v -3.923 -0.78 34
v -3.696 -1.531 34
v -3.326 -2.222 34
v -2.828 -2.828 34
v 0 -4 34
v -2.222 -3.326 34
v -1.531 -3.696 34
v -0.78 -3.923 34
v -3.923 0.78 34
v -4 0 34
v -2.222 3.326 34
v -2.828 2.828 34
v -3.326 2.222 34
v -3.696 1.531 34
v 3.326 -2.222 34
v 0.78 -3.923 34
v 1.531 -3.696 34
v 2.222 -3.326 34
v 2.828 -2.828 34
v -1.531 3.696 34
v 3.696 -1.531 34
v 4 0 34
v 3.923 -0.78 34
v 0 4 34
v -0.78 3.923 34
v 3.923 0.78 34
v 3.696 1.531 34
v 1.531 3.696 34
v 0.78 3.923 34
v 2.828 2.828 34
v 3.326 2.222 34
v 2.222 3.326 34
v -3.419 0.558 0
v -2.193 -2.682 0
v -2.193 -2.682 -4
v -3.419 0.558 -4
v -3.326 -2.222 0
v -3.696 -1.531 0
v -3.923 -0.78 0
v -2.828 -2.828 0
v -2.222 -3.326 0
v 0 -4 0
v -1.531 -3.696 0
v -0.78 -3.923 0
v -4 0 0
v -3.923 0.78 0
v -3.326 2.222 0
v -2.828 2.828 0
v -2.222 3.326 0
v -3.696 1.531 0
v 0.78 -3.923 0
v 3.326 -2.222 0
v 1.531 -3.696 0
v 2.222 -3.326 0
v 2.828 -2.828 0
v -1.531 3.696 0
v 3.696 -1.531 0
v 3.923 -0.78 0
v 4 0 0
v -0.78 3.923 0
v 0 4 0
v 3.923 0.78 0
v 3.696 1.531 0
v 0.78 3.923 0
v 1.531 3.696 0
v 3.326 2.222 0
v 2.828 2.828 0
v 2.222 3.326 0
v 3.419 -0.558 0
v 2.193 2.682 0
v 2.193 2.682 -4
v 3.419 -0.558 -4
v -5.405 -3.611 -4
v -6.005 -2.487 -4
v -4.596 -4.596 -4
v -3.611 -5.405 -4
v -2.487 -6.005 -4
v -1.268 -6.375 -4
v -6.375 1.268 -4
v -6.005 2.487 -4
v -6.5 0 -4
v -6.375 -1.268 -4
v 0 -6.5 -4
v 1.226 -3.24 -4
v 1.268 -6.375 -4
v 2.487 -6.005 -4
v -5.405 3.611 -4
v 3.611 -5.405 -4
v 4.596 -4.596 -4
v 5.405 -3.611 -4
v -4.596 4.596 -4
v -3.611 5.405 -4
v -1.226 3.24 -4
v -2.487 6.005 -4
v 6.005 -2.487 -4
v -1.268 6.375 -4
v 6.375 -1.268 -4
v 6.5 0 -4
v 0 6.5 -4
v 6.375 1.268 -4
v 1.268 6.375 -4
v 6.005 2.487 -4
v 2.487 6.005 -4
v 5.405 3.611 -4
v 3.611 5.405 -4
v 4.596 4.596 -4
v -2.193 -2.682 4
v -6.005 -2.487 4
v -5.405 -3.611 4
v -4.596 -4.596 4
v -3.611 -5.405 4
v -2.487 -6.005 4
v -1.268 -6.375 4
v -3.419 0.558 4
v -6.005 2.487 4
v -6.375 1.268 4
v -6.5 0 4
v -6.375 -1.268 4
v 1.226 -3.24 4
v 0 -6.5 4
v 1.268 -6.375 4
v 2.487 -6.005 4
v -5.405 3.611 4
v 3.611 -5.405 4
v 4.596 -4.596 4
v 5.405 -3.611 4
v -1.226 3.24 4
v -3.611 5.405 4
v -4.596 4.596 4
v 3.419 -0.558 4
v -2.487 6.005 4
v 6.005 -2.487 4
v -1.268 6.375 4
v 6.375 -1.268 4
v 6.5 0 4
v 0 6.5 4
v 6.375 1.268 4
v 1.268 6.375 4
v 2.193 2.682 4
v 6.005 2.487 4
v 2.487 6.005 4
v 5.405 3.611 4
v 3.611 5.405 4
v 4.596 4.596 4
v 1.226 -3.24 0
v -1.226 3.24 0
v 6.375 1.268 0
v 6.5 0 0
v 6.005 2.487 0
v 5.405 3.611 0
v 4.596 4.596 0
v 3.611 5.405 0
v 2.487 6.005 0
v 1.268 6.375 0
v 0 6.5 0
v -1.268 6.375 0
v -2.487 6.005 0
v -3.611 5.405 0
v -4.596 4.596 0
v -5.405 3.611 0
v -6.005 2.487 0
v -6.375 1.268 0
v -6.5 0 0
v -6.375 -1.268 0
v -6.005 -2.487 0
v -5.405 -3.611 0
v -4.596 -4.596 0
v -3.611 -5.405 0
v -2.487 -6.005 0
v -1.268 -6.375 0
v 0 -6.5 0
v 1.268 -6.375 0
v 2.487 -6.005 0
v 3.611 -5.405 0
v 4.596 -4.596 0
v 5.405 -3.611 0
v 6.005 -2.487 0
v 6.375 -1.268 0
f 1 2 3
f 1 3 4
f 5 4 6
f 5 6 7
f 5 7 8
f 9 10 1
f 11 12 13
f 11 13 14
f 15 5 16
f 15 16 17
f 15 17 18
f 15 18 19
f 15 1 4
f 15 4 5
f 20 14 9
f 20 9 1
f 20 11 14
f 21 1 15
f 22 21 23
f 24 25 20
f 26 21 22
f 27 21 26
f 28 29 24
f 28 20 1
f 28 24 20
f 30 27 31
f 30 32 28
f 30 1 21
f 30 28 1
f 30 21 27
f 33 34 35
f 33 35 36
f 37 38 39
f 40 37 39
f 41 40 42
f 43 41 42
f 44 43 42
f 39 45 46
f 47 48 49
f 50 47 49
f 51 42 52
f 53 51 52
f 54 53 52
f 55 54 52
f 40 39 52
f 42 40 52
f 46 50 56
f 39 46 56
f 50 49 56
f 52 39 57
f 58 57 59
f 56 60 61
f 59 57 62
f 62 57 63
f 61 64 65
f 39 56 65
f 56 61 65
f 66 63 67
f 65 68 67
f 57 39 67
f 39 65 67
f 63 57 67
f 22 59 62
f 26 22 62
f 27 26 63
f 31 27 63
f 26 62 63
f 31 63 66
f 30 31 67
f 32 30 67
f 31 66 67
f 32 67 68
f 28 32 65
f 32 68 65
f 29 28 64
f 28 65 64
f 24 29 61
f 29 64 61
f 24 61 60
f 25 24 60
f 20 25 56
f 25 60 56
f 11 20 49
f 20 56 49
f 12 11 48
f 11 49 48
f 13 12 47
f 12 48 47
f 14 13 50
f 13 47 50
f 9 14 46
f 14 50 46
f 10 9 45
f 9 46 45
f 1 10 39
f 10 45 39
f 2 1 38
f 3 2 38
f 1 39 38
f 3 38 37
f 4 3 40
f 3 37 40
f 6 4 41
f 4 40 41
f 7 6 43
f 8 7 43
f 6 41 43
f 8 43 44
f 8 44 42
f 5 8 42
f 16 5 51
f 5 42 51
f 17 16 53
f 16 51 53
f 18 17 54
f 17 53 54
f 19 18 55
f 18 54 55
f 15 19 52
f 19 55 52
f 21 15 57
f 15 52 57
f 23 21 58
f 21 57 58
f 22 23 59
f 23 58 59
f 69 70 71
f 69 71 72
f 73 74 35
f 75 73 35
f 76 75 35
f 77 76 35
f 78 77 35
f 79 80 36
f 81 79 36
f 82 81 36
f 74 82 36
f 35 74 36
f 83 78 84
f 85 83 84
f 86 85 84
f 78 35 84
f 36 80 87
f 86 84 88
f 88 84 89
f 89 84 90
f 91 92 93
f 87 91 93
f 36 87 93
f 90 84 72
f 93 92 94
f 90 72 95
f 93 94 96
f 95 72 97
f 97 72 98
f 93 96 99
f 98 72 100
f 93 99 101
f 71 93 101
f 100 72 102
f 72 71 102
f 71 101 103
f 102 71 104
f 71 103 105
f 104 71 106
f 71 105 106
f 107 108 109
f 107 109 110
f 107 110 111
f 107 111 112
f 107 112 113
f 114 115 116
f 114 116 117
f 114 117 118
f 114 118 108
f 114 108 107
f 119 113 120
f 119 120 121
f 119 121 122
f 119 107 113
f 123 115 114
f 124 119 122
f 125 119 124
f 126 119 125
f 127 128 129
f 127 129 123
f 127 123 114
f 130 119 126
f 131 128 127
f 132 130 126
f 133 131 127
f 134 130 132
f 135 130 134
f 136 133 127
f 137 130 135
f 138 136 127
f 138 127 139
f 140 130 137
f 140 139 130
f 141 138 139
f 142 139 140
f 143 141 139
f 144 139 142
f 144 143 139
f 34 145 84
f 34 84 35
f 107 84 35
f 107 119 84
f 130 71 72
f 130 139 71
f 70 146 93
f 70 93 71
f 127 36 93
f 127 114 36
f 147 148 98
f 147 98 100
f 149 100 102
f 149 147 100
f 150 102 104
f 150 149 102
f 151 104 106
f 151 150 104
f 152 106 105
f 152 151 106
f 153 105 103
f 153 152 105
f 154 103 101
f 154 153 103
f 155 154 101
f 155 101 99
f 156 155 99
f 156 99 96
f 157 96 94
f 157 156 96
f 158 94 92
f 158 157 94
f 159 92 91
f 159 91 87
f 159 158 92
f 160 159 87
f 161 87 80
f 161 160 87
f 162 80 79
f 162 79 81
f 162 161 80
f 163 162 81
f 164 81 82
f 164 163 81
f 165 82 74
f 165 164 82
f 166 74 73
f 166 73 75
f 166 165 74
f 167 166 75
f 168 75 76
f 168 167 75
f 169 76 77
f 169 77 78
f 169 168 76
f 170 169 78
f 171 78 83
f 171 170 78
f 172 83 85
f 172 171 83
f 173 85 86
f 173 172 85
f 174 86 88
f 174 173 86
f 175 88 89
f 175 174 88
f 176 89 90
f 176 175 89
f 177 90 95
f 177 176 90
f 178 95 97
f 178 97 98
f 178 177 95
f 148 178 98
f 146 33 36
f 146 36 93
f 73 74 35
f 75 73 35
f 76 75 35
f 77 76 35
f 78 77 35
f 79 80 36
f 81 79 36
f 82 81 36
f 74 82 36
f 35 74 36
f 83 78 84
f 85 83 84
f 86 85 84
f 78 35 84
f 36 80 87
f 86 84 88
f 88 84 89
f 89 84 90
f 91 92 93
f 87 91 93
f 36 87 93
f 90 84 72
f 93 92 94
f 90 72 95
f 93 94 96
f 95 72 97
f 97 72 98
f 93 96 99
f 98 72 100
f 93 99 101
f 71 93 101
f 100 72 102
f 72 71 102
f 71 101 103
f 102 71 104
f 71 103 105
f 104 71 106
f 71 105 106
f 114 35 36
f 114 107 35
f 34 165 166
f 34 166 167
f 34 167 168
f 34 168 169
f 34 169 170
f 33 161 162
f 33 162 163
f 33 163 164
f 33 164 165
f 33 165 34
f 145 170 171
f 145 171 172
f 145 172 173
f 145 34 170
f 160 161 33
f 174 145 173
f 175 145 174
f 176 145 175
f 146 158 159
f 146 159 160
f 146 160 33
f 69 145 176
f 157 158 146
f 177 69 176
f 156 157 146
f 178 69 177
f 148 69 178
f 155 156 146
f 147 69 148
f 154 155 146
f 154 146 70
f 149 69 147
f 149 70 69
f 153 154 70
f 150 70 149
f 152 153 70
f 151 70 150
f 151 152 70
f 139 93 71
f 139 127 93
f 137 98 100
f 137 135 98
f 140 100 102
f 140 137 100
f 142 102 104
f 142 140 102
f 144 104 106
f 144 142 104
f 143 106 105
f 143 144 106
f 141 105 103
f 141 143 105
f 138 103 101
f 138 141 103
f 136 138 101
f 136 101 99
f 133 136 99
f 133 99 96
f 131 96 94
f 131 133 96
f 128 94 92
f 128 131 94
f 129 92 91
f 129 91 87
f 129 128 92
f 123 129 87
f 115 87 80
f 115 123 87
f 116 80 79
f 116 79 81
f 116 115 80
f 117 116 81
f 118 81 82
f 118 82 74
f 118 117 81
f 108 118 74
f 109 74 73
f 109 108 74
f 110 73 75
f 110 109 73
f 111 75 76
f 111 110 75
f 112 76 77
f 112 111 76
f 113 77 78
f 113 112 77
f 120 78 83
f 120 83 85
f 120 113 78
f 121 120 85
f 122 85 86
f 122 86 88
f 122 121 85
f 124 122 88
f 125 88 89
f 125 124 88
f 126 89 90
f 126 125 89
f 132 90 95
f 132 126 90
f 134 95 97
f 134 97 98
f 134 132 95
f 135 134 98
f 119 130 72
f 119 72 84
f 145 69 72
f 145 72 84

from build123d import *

# Parameters (mm, degrees)
F0_R     = 4
F1_DEPTH = 34
F0_R_2   = 6.5
F2_DEPTH = 4
F3_DEPTH = 4


with BuildPart() as f1:
    # F0 (on Top) → F1 (new body)
    with BuildSketch(Plane.XY):
        Circle(F0_R)
        Polygon((3.418825801, -0.5582384278), (1.2259642406, -3.2399092087), (-2.1928615604, -2.6816707809), (-3.418825801, 0.5582384278), (-1.2259642406, 3.2399092087), (2.1928615604, 2.6816707809), align=None, mode=Mode.SUBTRACT)
        Polygon((-2.1928615604, -2.6816707809), (1.2259642406, -3.2399092087), (3.418825801, -0.5582384278), (2.1928615604, 2.6816707809), (-1.2259642406, 3.2399092087), (-3.418825801, 0.5582384278), align=None)
    extrude(amount=F1_DEPTH)


with BuildPart() as f2:
    # F0 (on Top) → F2 (new body, symmetric)
    with BuildSketch(Plane.XY):
        Circle(F0_R_2)
        Circle(F0_R, mode=Mode.SUBTRACT)
        Circle(F0_R)
        Polygon((3.418825801, -0.5582384278), (1.2259642406, -3.2399092087), (-2.1928615604, -2.6816707809), (-3.418825801, 0.5582384278), (-1.2259642406, 3.2399092087), (2.1928615604, 2.6816707809), align=None, mode=Mode.SUBTRACT)
    extrude(amount=F2_DEPTH, both=True)


with BuildPart() as f3:
    # F0 (on Top) → F3 (new body)
    with BuildSketch(Plane.XY):
        Circle(F0_R_2)
        Circle(F0_R, mode=Mode.SUBTRACT)
        Circle(F0_R)
        Polygon((3.418825801, -0.5582384278), (1.2259642406, -3.2399092087), (-2.1928615604, -2.6816707809), (-3.418825801, 0.5582384278), (-1.2259642406, 3.2399092087), (2.1928615604, 2.6816707809), align=None, mode=Mode.SUBTRACT)
    extrude(amount=-F3_DEPTH)


solid = Compound([f1.part, f2.part, f3.part])
